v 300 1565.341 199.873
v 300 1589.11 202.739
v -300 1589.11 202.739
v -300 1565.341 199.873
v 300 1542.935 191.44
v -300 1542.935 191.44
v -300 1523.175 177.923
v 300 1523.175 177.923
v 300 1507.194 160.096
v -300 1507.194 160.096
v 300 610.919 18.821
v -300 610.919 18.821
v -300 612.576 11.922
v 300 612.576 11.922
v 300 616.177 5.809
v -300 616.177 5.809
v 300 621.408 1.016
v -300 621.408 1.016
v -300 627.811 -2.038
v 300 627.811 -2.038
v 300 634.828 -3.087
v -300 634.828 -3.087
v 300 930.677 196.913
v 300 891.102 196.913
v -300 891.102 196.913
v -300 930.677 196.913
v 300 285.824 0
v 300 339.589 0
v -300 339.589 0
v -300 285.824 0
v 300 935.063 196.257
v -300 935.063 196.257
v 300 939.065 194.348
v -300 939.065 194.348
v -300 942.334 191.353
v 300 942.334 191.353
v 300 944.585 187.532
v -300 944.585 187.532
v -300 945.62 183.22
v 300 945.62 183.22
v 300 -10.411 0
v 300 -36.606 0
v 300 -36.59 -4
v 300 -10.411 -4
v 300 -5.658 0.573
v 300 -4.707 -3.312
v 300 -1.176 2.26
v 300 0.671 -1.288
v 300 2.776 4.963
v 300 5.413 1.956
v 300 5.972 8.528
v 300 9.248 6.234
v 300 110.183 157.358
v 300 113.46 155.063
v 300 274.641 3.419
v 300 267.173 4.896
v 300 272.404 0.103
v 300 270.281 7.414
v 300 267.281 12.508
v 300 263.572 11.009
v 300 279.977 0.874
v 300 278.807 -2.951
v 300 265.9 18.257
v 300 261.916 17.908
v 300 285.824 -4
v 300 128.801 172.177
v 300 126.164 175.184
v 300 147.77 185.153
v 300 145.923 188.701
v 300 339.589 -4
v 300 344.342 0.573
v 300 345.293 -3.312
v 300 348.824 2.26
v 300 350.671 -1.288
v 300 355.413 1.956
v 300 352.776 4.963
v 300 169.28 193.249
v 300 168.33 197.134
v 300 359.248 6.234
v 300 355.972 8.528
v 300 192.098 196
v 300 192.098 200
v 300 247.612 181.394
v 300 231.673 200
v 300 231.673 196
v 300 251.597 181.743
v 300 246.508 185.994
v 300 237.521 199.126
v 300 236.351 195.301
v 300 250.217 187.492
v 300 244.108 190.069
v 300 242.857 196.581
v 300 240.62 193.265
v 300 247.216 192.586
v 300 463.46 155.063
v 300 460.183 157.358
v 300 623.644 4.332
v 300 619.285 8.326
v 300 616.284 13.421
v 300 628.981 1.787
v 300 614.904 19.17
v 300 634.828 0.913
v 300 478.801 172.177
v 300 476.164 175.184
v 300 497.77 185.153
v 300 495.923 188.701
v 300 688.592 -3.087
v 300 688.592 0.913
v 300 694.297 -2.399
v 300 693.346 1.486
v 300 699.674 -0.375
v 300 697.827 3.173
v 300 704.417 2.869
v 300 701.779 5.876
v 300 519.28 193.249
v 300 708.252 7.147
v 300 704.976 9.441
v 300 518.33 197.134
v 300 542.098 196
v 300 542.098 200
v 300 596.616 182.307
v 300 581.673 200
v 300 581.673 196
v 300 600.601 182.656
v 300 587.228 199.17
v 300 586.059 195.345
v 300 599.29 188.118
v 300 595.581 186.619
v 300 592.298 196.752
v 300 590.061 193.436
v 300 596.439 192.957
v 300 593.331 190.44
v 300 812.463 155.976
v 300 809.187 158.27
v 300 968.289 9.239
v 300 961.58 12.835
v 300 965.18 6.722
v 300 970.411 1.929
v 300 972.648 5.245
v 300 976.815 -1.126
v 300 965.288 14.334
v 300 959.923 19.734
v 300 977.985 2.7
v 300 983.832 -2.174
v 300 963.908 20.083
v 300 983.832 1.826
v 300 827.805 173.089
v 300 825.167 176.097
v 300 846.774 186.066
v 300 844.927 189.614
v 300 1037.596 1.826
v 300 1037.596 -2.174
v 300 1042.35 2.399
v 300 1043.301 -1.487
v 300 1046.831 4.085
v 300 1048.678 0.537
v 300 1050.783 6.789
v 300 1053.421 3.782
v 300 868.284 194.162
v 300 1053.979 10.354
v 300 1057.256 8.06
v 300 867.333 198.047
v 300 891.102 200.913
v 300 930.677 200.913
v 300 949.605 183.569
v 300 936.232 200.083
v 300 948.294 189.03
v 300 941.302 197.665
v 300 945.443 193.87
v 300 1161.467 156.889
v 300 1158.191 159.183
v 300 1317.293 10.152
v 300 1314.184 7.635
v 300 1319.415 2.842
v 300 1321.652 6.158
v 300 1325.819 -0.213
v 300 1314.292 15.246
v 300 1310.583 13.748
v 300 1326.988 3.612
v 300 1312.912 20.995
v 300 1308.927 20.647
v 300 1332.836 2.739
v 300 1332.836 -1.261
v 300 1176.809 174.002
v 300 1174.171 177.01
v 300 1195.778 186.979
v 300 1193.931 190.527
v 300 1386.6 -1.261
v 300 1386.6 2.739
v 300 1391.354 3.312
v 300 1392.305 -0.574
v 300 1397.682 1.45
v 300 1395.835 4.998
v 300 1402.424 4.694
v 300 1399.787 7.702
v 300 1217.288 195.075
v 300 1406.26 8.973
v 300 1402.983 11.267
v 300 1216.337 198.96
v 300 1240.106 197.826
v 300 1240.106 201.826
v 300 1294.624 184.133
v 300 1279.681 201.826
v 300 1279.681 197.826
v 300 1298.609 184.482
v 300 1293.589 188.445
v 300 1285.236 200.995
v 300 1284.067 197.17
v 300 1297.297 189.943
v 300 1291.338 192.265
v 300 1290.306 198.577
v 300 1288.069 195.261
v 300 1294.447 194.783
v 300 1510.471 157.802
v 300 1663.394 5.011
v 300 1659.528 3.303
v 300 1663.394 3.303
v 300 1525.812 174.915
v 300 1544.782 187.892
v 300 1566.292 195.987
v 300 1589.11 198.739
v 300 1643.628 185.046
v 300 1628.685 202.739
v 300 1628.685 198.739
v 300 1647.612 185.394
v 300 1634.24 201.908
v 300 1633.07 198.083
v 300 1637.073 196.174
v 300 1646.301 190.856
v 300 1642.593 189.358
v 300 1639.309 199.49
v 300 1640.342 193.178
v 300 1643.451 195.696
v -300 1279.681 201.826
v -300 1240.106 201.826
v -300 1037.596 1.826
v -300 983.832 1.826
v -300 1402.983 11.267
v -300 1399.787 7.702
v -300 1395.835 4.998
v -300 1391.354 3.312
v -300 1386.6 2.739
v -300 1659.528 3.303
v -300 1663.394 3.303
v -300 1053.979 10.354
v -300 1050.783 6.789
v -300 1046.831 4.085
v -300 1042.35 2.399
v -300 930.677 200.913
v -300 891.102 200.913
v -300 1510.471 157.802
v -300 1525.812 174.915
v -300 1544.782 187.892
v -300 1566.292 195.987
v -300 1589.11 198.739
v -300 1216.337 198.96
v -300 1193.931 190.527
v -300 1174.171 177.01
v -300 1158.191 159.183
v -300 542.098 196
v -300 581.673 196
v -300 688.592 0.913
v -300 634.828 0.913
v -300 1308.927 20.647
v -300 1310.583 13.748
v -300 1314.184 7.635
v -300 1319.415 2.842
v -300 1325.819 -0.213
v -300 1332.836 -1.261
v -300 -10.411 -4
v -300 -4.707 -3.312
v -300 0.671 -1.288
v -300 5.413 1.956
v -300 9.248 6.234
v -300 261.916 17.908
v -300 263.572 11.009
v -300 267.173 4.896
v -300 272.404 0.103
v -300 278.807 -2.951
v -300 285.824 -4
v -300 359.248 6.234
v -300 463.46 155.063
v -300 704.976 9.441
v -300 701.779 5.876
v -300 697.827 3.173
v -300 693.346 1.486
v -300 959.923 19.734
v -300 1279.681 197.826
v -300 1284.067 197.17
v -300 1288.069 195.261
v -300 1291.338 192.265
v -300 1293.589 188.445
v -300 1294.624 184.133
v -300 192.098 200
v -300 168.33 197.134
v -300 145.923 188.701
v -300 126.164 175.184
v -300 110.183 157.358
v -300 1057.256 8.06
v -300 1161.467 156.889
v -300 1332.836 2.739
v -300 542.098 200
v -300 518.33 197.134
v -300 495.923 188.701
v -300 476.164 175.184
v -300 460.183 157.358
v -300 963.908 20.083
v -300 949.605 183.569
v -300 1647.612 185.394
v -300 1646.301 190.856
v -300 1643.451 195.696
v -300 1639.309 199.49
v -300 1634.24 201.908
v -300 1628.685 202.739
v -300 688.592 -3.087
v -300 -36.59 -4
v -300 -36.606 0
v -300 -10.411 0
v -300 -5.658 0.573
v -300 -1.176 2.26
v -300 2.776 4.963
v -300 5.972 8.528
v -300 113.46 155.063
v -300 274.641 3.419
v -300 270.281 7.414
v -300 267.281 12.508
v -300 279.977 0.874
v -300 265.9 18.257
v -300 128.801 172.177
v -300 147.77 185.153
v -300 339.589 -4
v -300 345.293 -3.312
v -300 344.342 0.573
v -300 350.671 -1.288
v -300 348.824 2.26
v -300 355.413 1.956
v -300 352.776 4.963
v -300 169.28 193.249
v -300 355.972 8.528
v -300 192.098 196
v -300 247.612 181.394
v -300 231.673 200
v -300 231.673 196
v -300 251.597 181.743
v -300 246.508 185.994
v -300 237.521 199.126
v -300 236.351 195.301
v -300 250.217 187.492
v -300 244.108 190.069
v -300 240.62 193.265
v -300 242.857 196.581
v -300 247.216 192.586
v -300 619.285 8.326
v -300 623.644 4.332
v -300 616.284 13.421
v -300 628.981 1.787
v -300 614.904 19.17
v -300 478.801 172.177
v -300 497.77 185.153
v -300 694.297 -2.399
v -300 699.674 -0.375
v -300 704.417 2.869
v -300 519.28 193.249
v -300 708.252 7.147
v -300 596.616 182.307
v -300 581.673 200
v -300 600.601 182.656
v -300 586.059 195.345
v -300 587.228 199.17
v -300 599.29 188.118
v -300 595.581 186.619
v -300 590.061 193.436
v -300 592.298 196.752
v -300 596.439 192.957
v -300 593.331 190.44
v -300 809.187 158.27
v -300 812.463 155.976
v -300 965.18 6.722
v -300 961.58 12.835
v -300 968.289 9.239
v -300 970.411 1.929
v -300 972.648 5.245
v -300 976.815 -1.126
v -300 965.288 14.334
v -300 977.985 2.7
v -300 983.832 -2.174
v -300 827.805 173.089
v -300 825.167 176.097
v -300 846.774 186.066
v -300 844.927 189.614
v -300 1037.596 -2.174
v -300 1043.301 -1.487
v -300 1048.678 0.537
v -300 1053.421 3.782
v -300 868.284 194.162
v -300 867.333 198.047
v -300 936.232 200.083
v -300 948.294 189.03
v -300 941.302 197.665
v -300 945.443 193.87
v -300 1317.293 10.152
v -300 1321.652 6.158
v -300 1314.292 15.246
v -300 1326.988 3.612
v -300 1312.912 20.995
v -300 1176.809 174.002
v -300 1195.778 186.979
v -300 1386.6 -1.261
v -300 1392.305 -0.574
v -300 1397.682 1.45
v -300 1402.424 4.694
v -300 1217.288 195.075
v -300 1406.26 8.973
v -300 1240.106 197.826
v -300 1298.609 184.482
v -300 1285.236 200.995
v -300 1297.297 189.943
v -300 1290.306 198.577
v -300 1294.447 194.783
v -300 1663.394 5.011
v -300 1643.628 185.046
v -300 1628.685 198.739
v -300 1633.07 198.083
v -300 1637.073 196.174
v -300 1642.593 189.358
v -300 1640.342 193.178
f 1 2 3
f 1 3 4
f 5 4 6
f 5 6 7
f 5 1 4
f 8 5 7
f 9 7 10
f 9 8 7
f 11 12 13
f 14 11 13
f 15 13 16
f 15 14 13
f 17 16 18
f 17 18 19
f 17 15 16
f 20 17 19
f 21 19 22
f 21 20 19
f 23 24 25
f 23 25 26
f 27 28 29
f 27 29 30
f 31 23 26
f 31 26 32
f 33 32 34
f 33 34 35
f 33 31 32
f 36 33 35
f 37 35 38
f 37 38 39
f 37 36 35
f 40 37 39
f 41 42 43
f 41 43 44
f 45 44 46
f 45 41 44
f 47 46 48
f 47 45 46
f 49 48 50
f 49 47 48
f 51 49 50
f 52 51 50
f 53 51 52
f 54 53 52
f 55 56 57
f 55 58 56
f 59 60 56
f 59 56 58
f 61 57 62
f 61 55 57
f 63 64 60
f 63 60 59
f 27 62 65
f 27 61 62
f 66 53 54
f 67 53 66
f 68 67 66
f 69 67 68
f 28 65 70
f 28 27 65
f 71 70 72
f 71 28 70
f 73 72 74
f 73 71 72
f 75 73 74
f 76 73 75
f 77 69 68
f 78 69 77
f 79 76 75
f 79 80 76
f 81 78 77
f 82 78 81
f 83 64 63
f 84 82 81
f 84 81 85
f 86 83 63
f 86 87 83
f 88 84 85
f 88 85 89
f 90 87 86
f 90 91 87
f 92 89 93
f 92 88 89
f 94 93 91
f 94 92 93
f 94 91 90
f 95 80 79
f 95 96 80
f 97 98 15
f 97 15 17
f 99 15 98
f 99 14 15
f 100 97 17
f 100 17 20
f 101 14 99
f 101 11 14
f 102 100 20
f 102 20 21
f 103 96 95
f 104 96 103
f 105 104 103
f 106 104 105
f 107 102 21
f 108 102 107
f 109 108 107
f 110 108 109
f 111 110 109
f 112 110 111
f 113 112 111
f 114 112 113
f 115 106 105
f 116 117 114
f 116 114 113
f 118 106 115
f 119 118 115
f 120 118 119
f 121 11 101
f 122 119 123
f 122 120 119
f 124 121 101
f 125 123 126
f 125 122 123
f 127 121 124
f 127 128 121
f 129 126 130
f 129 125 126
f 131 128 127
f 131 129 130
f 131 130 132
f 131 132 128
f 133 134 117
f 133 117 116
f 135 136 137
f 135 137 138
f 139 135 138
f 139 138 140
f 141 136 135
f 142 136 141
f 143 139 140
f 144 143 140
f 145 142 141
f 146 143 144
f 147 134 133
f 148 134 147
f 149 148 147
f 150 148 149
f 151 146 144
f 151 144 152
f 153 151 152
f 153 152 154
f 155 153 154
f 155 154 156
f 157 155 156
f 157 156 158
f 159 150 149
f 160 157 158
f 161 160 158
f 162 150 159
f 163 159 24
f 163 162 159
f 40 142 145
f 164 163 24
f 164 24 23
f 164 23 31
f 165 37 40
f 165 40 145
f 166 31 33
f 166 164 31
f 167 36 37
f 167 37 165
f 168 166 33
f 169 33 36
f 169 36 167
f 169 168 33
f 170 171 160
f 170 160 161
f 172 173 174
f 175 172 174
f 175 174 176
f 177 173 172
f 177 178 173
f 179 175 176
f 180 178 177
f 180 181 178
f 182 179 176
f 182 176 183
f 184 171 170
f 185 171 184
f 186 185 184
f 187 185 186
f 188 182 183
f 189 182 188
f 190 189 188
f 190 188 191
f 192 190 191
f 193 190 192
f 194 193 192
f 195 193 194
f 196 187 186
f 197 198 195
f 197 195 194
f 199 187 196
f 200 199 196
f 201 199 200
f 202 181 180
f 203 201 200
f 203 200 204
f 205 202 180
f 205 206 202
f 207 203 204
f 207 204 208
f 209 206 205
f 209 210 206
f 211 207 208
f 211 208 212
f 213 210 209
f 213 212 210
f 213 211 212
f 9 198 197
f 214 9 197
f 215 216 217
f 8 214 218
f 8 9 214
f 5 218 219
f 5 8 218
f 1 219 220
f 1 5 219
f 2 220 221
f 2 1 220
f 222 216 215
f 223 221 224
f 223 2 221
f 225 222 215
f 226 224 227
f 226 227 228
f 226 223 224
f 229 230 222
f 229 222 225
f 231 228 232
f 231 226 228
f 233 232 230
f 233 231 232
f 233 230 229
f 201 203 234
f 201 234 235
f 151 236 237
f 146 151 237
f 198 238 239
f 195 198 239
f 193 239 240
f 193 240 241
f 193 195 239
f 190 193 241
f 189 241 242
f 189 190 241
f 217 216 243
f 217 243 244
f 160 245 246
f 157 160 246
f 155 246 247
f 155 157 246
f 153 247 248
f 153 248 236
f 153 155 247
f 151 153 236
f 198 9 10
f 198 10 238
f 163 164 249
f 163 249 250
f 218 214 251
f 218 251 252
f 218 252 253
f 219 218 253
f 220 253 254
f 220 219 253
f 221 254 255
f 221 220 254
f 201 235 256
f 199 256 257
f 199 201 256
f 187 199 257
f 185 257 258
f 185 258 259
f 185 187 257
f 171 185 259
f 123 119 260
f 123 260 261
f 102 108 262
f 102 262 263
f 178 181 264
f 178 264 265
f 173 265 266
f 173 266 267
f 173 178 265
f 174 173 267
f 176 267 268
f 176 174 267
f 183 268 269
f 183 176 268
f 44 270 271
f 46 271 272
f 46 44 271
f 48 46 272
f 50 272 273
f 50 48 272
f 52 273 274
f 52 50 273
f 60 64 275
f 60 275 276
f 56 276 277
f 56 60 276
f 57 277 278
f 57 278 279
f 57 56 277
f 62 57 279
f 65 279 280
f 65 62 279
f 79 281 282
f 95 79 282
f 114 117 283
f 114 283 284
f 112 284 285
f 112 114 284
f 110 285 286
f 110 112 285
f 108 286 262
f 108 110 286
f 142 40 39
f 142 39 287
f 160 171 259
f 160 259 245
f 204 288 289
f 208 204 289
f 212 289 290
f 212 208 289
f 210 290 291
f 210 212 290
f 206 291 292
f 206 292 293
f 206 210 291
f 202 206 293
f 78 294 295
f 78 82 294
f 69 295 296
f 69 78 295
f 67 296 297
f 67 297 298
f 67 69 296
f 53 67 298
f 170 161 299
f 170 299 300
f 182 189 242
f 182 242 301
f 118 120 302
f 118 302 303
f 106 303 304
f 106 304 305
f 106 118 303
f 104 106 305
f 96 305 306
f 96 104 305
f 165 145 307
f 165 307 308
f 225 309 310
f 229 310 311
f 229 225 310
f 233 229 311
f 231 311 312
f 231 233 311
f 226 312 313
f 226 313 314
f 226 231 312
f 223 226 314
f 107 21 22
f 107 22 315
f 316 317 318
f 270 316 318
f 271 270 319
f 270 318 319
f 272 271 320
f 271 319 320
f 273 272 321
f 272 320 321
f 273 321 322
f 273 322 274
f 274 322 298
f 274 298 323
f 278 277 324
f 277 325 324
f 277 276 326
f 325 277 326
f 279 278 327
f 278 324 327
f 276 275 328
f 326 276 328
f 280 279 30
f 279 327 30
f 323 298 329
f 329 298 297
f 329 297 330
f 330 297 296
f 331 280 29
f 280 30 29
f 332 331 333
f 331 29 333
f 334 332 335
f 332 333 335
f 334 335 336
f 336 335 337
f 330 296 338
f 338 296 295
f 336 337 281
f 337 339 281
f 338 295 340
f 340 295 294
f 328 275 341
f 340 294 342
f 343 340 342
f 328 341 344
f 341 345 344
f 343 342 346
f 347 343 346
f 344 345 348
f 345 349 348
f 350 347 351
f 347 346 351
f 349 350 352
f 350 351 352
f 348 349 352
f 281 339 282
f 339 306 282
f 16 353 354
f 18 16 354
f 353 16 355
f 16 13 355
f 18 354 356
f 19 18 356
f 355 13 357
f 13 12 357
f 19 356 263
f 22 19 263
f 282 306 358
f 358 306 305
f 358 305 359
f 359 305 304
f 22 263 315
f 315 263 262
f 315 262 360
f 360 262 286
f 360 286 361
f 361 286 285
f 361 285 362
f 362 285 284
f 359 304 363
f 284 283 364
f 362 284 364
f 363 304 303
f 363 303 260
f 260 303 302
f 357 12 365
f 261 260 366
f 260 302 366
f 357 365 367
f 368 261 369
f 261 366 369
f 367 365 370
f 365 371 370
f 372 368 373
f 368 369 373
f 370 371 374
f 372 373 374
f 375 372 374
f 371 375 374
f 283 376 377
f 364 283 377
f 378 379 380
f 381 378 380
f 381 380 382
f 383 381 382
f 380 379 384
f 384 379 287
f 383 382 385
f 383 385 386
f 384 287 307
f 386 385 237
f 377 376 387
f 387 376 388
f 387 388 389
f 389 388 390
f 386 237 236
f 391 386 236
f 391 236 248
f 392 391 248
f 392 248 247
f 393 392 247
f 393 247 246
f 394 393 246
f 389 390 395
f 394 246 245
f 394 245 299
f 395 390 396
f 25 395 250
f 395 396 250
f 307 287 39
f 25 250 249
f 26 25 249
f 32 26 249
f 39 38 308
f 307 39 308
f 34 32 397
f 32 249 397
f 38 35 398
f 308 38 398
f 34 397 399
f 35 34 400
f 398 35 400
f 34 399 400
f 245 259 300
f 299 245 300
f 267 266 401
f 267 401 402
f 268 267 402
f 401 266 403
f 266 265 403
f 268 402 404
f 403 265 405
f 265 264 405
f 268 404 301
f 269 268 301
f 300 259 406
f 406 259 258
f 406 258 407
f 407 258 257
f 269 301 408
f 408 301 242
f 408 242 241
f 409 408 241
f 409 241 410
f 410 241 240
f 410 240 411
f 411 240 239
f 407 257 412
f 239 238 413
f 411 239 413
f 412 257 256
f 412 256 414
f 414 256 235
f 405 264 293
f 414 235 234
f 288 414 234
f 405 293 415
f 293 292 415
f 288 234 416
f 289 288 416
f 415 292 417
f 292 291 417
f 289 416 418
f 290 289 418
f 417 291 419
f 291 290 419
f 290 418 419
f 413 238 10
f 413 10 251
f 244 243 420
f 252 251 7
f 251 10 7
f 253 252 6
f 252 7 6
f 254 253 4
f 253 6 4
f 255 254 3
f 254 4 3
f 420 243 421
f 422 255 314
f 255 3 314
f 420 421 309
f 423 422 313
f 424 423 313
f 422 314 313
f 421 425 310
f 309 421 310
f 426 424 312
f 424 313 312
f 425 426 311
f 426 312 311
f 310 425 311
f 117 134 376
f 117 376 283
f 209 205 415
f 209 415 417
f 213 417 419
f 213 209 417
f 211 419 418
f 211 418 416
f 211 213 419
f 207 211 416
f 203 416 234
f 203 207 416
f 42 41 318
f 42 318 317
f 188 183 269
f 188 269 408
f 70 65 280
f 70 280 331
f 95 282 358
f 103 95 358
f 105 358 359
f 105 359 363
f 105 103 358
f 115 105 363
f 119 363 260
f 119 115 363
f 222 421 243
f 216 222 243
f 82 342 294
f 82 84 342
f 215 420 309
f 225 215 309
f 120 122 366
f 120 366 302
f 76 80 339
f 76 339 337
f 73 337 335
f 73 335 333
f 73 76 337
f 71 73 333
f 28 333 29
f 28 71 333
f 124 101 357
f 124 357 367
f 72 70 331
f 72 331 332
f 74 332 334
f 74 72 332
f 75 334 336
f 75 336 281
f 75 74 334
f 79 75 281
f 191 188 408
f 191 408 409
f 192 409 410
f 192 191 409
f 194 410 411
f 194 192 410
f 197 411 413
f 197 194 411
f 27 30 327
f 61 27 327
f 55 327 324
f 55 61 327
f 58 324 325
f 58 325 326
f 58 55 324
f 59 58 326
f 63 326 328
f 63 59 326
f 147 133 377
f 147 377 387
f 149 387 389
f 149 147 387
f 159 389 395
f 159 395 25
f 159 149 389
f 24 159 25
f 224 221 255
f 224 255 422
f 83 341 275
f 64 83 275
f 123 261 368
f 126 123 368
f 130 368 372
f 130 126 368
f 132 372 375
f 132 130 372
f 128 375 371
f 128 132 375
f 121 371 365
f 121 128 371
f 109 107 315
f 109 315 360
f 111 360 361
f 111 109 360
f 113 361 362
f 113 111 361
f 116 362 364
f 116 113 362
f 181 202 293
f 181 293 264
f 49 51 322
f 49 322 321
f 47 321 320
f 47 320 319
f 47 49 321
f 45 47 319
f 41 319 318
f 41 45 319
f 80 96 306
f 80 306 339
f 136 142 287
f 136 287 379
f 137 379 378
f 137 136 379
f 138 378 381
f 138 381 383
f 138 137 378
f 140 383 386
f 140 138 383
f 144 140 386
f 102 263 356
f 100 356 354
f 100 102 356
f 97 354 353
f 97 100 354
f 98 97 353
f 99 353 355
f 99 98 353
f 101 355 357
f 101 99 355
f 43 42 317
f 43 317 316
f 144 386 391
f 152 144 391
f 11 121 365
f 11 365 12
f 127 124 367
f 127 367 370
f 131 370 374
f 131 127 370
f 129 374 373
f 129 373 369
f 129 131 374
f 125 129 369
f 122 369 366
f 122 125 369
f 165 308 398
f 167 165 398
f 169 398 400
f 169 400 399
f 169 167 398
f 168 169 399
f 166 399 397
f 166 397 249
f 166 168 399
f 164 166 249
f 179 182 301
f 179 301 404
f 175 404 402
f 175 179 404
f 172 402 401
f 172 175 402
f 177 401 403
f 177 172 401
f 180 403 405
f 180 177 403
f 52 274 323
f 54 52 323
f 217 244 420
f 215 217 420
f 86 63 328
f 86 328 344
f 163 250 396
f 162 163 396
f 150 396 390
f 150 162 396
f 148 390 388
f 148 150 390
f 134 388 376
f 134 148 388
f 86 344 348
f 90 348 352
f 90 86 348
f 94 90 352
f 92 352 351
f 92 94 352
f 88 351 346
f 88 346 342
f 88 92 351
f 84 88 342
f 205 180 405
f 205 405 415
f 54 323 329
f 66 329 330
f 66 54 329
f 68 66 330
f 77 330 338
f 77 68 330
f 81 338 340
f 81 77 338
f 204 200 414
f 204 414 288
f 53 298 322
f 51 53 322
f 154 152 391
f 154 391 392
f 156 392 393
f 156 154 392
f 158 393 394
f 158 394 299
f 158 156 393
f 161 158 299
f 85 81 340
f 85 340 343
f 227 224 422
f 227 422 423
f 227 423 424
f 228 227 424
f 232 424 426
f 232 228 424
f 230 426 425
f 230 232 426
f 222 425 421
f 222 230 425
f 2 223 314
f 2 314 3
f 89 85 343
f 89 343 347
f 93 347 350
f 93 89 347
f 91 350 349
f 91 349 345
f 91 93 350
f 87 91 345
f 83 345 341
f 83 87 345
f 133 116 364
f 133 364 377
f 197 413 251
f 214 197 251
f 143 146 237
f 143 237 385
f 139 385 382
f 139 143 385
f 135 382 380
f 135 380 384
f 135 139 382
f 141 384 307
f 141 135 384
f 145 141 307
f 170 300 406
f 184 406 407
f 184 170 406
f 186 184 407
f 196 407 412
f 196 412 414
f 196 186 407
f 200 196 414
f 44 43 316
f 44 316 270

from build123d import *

# Parameters (mm, degrees)
F1_DEPTH      = 300
F1_DEPTH_BACK = 300


with BuildPart() as f1:
    # F0 (on Right) → F1 (new body, two sides)
    with BuildSketch(Plane.YZ) as f1_sk:
        with BuildLine():
            Line((110.183008, 157.357644), (5.9717, 8.528471))
            ThreePointArc((5.9717, 8.528471), (-1.176369, 2.259783), (-10.411341, 0))
            Line((-10.411341, 0), (-36.606026, 0))
            Line((-36.606026, 0), (-36.590081, -4))
            Line((-36.590081, -4), (-10.411341, -4))
            ThreePointArc((-10.411341, -4), (0.670626, -1.28826), (9.248308, 6.234166))
            Line((9.248308, 6.234166), (113.459616, 155.063338))
            ThreePointArc((113.459616, 155.063338), (147.770346, 185.15304), (192.098213, 196))
            Line((192.098213, 196), (231.673377, 196))
            ThreePointArc((231.673377, 196), (242.48282, 191.796437), (247.612492, 181.394492))
            Line((247.612492, 181.394492), (261.915687, 17.908216))
            ThreePointArc((261.915687, 17.908216), (269.610202, 2.305292), (285.824377, -4.000046))
            Line((285.824377, -4.000046), (339.588671, -4.000007))
            ThreePointArc((339.588671, -4.000007), (350.670628, -1.288263), (359.248303, 6.234158))
            Line((359.248303, 6.234158), (463.459616, 155.063338))
            ThreePointArc((463.459616, 155.063338), (497.770346, 185.15304), (542.098213, 196))
            Line((542.098213, 196), (581.673377, 196))
            ThreePointArc((581.673377, 196), (591.80723, 192.05916), (596.616297, 182.307336))
            Line((596.616297, 182.307336), (610.919489, 18.821106))
            ThreePointArc((610.919489, 18.821106), (618.613997, 3.218188), (634.828161, -3.087156))
            Line((634.828161, -3.087156), (688.592464, -3.087156))
            ThreePointArc((688.592464, -3.087156), (699.674431, -0.375416), (708.252113, 7.14701))
            Line((708.252113, 7.14701), (812.463422, 155.976182))
            ThreePointArc((812.463422, 155.976182), (846.774151, 186.065884), (891.102018, 196.912844))
            Line((891.102018, 196.912844), (930.677182, 196.912844))
            ThreePointArc((930.677182, 196.912844), (940.811035, 192.972004), (945.620102, 183.22018))
            Line((945.620102, 183.22018), (959.923294, 19.733951))
            ThreePointArc((959.923294, 19.733951), (967.617802, 4.131032), (983.831967, -2.174311))
            Line((983.831967, -2.174311), (1037.59627, -2.174311))
            ThreePointArc((1037.59627, -2.174311), (1048.678236, 0.537429), (1057.255919, 8.059854))
            Line((1057.255919, 8.059854), (1161.467227, 156.889026))
            ThreePointArc((1161.467227, 156.889026), (1195.777956, 186.978728), (1240.105823, 197.825689))
            Line((1240.105823, 197.825689), (1279.680987, 197.825689))
            ThreePointArc((1279.680987, 197.825689), (1289.81484, 193.884849), (1294.623908, 184.133025))
            Line((1294.623908, 184.133025), (1308.927099, 20.646795))
            ThreePointArc((1308.927099, 20.646795), (1316.621607, 5.043877), (1332.835772, -1.261467))
            Line((1332.835772, -1.261467), (1386.600075, -1.261467))
            ThreePointArc((1386.600075, -1.261467), (1397.682042, 1.450273), (1406.259724, 8.972698))
            Line((1406.259724, 8.972698), (1510.471032, 157.801871))
            ThreePointArc((1510.471032, 157.801871), (1544.781762, 187.891573), (1589.109629, 198.738533))
            Line((1589.109629, 198.738533), (1628.684792, 198.738533))
            ThreePointArc((1628.684792, 198.738533), (1638.818646, 194.797693), (1643.627713, 185.045869))
            Line((1643.627713, 185.045869), (1659.528175, 3.302754))
            Line((1659.528175, 3.302754), (1663.393974, 3.302754))
            Line((1663.393974, 3.302754), (1663.393974, 5.01132))
            Line((1663.393974, 5.01132), (1647.612492, 185.394492))
            ThreePointArc((1647.612492, 185.394492), (1641.521006, 197.746802), (1628.684792, 202.738533))
            Line((1628.684792, 202.738533), (1589.109629, 202.738533))
            ThreePointArc((1589.109629, 202.738533), (1542.934767, 191.439616), (1507.194424, 160.096176))
            Line((1507.194424, 160.096176), (1402.983116, 11.267004))
            ThreePointArc((1402.983116, 11.267004), (1395.835047, 4.998316), (1386.600075, 2.738533))
            Line((1386.600075, 2.738533), (1332.835772, 2.738533))
            ThreePointArc((1332.835772, 2.738533), (1319.323968, 7.992986), (1312.911878, 20.995418))
            Line((1312.911878, 20.995418), (1298.608686, 184.481648))
            ThreePointArc((1298.608686, 184.481648), (1292.517201, 196.833958), (1279.680987, 201.825689))
            Line((1279.680987, 201.825689), (1240.105823, 201.825689))
            ThreePointArc((1240.105823, 201.825689), (1193.930962, 190.526772), (1158.190619, 159.183332))
            Line((1158.190619, 159.183332), (1053.97931, 10.35416))
            ThreePointArc((1053.97931, 10.35416), (1046.831242, 4.085472), (1037.59627, 1.825689))
            Line((1037.59627, 1.825689), (983.831967, 1.825689))
            ThreePointArc((983.831967, 1.825689), (970.320163, 7.080142), (963.908073, 20.082574))
            Line((963.908073, 20.082574), (949.604881, 183.568803))
            ThreePointArc((949.604881, 183.568803), (943.513396, 195.921114), (930.677182, 200.912844))
            Line((930.677182, 200.912844), (891.102018, 200.912844))
            ThreePointArc((891.102018, 200.912844), (844.927157, 189.613928), (809.186814, 158.270488))
            Line((809.186814, 158.270488), (704.975505, 9.441316))
            ThreePointArc((704.975505, 9.441316), (697.827437, 3.172628), (688.592464, 0.912844))
            Line((688.592464, 0.912844), (634.828161, 0.912844))
            ThreePointArc((634.828161, 0.912844), (621.316357, 6.167298), (614.904268, 19.169729))
            Line((614.904268, 19.169729), (600.601076, 182.655959))
            ThreePointArc((600.601076, 182.655959), (594.50959, 195.008269), (581.673377, 200))
            Line((581.673377, 200), (542.098213, 200))
            ThreePointArc((542.098213, 200), (495.923351, 188.701083), (460.183008, 157.357644))
            Line((460.183008, 157.357644), (355.971695, 8.528464))
            ThreePointArc((355.971695, 8.528464), (348.823632, 2.259779), (339.588668, -7e-06))
            Line((339.588668, -7e-06), (285.824374, -4.6e-05))
            ThreePointArc((285.824374, -4.6e-05), (272.312561, 5.254403), (265.900466, 18.256839))
            Line((265.900466, 18.256839), (251.59727, 181.743115))
            ThreePointArc((251.59727, 181.743115), (245.185181, 194.745547), (231.673377, 200))
            Line((231.673377, 200), (192.098213, 200))
            ThreePointArc((192.098213, 200), (145.923351, 188.701083), (110.183008, 157.357644))
        make_face()
    extrude(amount=F1_DEPTH)
    extrude(f1_sk.sketch, amount=-F1_DEPTH_BACK)


solid = f1.part
